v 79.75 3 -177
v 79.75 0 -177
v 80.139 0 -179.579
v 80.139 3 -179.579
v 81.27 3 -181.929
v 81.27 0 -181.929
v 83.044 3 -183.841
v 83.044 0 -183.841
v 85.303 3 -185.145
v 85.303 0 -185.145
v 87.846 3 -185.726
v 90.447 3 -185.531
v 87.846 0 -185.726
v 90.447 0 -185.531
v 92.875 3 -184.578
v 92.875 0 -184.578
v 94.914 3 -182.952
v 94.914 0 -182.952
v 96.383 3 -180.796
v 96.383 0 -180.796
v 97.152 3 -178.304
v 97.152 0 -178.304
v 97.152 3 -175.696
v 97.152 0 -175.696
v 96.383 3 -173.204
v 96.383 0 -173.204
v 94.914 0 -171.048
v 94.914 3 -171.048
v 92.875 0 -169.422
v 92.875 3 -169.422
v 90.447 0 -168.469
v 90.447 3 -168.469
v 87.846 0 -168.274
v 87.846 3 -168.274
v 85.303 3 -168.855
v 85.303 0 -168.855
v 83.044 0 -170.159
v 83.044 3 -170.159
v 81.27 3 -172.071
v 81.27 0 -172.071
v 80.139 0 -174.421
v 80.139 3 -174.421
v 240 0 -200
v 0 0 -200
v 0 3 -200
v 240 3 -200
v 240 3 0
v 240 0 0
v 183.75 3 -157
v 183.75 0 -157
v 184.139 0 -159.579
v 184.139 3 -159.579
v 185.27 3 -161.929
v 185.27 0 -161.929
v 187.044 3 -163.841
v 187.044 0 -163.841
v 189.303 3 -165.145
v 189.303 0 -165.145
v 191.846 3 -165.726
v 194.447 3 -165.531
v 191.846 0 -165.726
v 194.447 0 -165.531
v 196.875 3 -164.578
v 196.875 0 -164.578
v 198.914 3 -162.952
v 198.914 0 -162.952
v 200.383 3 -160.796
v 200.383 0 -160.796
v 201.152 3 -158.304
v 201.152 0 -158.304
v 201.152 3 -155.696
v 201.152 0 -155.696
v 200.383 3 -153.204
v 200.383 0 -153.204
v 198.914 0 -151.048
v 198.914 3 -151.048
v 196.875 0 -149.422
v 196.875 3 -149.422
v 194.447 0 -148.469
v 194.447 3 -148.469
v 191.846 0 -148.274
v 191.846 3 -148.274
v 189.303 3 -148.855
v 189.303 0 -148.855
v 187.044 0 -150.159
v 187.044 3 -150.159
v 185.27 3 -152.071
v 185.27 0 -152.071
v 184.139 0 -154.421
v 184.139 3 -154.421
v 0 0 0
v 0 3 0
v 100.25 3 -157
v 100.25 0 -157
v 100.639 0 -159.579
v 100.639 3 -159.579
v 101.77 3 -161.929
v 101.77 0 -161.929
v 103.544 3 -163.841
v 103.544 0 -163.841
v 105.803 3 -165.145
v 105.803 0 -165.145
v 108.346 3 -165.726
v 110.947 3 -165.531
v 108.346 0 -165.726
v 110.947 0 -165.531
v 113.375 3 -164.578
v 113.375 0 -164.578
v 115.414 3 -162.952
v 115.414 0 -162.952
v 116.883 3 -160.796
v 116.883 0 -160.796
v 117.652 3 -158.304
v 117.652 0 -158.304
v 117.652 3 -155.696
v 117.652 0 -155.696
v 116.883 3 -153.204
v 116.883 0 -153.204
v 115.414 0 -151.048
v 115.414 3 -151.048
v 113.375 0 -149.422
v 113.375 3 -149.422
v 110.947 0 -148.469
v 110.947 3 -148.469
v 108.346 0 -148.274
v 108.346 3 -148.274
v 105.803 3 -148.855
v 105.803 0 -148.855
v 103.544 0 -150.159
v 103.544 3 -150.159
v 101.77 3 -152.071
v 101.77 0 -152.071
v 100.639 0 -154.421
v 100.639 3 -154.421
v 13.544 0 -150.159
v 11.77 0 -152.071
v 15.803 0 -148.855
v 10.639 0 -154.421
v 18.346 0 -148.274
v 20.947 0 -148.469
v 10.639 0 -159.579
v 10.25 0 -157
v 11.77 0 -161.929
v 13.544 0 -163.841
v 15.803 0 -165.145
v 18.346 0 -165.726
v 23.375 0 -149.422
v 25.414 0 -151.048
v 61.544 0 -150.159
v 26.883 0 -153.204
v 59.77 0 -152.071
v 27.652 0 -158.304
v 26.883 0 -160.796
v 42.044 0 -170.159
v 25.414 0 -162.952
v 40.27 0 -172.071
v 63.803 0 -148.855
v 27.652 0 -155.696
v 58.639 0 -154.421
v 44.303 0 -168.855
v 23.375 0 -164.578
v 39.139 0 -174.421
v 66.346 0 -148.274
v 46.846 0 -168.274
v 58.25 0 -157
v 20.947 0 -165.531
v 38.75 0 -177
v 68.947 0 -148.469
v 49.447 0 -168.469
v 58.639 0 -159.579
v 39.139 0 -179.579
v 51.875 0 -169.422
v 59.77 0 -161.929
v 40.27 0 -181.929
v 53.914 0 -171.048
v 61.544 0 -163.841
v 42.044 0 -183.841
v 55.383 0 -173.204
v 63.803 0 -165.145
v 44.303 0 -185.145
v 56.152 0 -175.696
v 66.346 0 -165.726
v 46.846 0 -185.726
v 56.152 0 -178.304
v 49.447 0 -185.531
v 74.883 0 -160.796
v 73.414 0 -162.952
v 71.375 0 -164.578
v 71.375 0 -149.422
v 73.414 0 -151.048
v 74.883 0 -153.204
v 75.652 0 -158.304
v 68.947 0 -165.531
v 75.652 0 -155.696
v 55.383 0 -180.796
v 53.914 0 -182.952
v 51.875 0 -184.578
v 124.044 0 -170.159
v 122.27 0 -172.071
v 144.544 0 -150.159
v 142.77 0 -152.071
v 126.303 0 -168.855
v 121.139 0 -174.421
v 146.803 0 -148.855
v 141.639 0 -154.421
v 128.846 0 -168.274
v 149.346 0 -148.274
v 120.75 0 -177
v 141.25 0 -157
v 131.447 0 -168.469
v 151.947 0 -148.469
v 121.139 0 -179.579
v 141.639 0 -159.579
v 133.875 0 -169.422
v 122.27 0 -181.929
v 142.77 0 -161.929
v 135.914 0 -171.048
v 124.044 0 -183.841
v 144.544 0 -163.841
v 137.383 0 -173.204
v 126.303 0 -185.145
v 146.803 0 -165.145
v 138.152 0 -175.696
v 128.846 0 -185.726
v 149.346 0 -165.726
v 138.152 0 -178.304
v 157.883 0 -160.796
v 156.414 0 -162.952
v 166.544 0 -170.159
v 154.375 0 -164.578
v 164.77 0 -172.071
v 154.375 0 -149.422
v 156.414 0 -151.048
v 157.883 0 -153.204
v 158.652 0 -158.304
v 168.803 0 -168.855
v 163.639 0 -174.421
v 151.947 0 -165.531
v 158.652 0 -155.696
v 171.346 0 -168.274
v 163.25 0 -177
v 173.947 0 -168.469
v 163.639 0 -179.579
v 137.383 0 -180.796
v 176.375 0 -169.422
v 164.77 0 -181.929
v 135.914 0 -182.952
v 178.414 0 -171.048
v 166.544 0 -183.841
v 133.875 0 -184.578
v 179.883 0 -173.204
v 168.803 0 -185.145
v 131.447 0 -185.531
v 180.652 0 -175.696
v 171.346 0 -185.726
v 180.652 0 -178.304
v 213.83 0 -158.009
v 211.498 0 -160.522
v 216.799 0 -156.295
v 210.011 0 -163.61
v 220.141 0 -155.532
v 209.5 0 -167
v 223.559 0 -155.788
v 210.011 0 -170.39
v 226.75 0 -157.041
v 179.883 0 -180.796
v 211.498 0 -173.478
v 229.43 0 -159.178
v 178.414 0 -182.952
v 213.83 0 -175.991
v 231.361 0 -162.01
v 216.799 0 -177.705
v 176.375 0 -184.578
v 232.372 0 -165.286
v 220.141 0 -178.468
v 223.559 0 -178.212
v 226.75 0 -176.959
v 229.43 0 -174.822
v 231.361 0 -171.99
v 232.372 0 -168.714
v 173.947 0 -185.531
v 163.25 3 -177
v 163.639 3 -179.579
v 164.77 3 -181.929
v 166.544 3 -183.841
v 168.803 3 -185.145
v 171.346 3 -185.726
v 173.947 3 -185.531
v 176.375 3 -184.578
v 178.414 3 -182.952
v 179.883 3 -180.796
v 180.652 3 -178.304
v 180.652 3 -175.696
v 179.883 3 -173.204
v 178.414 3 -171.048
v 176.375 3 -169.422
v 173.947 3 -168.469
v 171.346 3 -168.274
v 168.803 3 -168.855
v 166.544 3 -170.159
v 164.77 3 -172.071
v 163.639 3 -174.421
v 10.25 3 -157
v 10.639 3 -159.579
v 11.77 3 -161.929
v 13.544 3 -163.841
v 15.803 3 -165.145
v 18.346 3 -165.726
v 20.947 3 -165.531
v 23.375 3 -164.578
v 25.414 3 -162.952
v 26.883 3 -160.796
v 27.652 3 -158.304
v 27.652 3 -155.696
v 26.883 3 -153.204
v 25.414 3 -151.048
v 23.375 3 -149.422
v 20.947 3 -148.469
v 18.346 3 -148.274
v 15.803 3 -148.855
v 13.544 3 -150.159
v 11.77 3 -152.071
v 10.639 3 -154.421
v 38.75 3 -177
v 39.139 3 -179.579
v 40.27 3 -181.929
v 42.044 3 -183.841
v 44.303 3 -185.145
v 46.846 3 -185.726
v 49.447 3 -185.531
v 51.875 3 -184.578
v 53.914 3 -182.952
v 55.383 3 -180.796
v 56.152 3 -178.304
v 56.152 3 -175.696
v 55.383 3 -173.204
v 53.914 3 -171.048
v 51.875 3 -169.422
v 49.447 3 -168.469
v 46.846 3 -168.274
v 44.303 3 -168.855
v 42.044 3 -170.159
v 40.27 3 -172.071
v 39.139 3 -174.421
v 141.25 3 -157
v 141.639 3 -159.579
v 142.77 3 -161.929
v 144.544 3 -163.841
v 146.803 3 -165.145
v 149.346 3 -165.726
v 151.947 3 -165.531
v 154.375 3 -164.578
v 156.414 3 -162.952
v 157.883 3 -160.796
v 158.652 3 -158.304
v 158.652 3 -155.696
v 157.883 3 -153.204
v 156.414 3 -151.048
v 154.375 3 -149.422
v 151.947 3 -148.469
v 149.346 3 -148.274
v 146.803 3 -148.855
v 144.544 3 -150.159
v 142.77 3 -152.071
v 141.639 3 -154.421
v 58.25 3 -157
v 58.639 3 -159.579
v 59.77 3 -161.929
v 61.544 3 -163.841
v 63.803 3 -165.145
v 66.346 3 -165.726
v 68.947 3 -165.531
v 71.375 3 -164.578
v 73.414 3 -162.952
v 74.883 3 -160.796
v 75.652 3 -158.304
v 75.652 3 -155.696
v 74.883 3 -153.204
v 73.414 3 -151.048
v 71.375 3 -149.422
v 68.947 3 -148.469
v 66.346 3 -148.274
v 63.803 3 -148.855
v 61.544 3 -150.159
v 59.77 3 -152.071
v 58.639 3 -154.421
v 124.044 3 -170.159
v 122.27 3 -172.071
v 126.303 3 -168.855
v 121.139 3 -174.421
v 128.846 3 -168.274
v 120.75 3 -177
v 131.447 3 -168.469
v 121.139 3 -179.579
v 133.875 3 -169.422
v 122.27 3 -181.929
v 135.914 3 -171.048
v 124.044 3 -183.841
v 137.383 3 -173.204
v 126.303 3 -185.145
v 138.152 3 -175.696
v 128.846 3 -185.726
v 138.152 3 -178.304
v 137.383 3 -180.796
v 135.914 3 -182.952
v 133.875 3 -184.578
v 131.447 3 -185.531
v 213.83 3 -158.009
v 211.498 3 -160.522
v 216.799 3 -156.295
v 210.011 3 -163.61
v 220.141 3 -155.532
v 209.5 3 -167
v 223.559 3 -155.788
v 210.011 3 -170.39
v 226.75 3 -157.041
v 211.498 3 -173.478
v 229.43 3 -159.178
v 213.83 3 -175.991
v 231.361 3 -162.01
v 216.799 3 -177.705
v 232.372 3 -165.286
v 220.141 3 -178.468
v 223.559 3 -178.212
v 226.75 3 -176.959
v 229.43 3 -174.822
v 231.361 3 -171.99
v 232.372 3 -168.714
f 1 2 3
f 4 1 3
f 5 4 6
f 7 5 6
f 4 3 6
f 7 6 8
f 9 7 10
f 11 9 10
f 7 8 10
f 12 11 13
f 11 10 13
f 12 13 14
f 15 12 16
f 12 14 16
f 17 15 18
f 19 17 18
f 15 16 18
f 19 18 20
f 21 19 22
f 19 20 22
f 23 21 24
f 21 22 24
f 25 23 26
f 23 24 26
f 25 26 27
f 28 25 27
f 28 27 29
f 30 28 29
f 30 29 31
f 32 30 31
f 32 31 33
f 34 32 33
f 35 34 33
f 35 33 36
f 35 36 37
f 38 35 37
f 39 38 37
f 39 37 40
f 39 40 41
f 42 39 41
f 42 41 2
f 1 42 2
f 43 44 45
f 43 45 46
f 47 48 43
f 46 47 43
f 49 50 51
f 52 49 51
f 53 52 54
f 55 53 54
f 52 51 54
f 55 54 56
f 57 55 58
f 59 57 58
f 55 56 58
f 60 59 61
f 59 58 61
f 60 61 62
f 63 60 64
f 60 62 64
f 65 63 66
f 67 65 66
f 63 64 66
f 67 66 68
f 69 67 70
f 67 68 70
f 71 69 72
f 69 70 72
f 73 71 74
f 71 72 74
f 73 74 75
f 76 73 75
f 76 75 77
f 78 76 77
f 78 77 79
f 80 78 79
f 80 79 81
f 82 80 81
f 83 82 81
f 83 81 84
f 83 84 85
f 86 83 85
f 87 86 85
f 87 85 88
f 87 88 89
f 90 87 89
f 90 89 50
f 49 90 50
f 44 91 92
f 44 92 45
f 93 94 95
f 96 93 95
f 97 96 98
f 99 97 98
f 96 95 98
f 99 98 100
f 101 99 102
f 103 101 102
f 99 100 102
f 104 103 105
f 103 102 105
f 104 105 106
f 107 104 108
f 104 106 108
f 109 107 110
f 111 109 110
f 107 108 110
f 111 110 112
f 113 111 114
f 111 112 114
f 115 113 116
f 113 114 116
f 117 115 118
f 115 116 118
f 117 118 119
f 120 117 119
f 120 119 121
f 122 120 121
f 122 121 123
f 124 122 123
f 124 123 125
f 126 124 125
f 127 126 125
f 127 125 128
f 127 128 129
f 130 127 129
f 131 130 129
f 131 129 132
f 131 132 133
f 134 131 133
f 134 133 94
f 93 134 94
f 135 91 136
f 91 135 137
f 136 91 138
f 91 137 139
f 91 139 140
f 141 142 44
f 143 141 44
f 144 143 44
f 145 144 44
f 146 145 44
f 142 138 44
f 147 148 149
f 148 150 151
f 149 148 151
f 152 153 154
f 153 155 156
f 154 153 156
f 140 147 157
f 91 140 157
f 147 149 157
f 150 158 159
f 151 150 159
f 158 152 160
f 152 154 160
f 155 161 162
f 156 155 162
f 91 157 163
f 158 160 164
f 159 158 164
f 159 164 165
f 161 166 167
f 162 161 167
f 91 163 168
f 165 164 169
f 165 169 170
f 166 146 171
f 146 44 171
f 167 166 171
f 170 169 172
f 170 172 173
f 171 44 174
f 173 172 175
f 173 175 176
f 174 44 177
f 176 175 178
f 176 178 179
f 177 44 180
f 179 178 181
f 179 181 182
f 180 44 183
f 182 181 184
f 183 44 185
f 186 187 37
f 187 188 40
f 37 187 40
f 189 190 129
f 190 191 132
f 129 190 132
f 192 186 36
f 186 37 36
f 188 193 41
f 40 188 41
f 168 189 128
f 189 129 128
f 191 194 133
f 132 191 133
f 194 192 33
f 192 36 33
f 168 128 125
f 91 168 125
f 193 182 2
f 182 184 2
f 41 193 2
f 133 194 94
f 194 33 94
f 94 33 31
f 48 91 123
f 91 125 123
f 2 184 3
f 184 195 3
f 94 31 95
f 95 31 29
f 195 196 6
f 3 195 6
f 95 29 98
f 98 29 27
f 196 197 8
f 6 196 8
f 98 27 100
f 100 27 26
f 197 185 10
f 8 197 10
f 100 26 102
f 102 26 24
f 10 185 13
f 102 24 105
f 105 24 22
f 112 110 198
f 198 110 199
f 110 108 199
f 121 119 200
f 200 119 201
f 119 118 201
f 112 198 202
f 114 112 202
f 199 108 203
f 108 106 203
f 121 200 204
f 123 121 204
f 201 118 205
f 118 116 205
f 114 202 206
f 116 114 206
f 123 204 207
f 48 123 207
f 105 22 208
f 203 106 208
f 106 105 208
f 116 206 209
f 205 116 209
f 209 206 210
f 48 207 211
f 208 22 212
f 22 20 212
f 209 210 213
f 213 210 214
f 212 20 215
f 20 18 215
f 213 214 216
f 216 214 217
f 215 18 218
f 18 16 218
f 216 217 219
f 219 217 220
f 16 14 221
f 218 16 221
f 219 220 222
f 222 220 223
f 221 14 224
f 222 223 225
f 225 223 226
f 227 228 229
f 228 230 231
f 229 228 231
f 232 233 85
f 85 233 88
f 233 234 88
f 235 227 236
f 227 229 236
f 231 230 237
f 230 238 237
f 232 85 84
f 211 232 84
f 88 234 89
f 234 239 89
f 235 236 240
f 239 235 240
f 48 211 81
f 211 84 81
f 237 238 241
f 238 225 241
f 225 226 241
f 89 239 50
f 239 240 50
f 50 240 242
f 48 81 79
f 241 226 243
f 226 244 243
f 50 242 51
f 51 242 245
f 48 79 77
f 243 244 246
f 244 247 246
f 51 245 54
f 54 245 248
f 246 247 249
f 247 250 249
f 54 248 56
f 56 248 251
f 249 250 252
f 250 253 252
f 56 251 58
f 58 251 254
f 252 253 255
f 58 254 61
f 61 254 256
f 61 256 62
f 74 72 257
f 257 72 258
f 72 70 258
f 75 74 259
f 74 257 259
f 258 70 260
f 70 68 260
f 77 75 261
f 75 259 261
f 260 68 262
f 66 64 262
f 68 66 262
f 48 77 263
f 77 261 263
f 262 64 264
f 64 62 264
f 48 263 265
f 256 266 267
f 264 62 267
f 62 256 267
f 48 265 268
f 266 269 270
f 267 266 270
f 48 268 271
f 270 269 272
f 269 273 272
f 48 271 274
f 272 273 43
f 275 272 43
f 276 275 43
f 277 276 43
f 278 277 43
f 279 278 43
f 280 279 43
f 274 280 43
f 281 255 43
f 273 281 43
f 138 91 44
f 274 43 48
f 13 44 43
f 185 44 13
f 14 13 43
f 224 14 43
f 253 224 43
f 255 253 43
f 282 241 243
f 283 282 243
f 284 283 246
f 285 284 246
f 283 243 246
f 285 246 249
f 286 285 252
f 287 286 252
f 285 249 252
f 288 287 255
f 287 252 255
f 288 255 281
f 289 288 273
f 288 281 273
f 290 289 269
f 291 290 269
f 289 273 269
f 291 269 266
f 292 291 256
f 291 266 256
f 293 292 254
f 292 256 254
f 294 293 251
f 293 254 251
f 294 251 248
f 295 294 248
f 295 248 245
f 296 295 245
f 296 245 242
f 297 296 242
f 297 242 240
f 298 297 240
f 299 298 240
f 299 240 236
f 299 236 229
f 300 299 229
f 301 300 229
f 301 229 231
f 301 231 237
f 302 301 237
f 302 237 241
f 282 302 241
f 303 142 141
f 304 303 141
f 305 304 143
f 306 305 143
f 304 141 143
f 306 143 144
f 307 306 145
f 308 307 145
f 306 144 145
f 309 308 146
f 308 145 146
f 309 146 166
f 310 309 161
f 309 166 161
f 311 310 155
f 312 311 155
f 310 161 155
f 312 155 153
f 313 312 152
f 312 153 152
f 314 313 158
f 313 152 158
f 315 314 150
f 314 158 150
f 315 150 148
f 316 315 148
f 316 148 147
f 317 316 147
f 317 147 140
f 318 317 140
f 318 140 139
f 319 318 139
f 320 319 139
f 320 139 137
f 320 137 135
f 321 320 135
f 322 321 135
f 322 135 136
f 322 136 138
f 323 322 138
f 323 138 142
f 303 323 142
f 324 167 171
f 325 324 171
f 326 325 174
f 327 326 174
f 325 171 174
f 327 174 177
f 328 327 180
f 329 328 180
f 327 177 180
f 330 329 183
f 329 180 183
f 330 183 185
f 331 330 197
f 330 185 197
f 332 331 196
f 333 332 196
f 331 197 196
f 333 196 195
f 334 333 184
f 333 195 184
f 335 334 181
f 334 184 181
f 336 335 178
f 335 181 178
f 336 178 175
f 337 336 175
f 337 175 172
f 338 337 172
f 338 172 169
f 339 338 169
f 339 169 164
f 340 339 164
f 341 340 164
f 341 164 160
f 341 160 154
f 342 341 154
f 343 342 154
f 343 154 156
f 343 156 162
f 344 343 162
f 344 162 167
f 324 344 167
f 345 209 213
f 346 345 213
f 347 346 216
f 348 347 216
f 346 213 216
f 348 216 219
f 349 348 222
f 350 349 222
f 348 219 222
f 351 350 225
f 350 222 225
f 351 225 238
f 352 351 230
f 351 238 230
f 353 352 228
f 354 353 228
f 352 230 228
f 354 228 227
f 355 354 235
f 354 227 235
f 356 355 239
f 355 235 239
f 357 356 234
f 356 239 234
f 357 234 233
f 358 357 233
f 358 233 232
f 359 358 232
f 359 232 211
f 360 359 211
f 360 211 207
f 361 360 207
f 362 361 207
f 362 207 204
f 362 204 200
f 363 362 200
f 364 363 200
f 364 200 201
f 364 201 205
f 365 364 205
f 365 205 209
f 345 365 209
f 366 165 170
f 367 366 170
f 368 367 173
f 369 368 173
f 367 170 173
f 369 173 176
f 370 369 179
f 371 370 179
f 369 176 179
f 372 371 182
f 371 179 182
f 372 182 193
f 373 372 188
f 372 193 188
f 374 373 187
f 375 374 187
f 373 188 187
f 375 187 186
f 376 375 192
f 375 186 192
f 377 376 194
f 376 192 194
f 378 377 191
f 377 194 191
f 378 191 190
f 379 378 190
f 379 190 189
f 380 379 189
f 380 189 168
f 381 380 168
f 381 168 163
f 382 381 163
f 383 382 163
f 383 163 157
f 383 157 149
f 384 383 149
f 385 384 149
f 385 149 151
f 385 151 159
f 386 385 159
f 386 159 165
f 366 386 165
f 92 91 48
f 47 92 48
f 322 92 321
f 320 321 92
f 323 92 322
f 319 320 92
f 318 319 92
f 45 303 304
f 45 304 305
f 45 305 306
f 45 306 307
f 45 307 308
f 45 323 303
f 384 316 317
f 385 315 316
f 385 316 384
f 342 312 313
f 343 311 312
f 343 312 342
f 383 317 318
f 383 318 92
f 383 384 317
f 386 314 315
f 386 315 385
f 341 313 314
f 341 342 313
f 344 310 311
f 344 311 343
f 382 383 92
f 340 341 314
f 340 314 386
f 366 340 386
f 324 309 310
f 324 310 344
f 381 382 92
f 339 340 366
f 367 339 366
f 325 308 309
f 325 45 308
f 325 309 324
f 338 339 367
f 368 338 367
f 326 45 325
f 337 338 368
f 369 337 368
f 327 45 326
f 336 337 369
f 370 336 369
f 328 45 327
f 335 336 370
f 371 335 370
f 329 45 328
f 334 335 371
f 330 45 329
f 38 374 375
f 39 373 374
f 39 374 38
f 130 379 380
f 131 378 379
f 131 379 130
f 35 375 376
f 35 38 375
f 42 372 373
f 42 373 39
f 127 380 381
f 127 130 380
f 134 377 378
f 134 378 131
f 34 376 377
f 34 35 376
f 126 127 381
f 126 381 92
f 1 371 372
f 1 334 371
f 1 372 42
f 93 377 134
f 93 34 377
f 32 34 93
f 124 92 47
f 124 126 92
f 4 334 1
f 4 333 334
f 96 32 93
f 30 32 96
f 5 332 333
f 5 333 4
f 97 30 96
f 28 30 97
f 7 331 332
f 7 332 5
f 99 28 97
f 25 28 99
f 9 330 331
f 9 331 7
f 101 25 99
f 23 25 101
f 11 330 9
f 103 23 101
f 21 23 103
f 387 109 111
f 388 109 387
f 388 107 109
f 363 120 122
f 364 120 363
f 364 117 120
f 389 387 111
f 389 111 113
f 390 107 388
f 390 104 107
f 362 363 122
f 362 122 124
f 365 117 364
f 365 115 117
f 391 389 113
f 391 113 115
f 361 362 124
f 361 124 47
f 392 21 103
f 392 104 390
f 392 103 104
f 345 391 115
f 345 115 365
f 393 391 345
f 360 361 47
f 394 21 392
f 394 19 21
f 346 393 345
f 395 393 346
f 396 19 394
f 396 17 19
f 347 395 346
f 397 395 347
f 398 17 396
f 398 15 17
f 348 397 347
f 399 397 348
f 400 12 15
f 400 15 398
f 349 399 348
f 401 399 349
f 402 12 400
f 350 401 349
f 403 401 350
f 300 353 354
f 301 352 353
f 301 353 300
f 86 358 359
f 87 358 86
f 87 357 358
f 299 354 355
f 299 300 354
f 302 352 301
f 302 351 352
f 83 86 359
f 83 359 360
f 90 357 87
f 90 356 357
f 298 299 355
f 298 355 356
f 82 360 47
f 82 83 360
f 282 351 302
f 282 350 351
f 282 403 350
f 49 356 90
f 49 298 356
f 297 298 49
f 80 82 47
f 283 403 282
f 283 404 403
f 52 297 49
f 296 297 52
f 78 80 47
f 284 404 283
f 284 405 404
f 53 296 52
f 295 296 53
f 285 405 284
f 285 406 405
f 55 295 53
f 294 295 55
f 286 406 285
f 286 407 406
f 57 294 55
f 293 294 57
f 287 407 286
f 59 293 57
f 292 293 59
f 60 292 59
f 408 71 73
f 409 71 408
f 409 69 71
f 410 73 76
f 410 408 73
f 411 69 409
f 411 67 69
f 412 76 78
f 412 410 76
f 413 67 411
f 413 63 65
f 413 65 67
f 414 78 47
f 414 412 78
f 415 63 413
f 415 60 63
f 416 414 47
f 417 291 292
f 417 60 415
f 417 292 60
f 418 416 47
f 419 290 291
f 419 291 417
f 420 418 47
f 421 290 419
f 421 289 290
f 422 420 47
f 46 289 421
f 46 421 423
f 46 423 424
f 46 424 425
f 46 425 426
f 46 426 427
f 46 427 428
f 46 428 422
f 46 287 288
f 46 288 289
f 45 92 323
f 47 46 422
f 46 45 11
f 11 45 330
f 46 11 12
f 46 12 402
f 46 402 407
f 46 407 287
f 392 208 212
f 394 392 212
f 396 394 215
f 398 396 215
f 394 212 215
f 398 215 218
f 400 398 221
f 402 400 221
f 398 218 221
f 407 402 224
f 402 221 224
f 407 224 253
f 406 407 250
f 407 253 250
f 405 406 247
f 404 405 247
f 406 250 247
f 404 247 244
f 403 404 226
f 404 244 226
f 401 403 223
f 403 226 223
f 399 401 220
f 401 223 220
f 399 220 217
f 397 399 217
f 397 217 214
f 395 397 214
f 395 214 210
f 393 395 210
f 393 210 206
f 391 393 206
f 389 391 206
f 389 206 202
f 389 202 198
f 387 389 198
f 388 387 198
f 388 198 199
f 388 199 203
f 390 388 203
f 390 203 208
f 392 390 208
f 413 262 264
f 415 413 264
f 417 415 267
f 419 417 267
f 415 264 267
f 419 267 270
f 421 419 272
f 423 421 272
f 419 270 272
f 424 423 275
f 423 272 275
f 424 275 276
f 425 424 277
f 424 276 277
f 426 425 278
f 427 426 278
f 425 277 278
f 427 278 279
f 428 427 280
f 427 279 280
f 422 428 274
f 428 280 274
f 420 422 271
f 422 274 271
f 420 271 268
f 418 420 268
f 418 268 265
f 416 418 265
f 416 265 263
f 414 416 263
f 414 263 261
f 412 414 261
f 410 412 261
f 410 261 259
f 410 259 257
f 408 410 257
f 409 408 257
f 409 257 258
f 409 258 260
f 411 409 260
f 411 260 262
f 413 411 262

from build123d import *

# Parameters (mm, degrees)
SKETCH1_W             = 240
SKETCH1_H             = 200
BOSS_EXTRUDE1_DEPTH   = 3
M16_CLEARANCE_HOLE1_D = 17.5
M22_CLEARANCE_HOLE1_D = 23


with BuildPart() as part:
    # Sketch1 → Boss-Extrude1 (new body)
    with BuildSketch(Plane(origin=(0, 0, 0), x_dir=(1, 0, 0), z_dir=(0, 1, 0))):
        with Locations((120, 100)):
            Rectangle(SKETCH1_W, SKETCH1_H)
    extrude(amount=BOSS_EXTRUDE1_DEPTH)

    # M16 Clearance Hole1 (through all)
    with Locations(Plane(origin=(0, 3, 0), x_dir=(1, 0, 0), z_dir=(0, 1, 0))):
        with Locations((19, 157), (47.5, 177), (67, 157), (88.5, 177), (109, 157), (129.5, 177), (150, 157), (172, 177), (192.5, 157)):
            Hole(M16_CLEARANCE_HOLE1_D / 2)

    # M22 Clearance Hole1 (through all)
    with Locations(Plane(origin=(0, 3, 0), x_dir=(1, 0, 0), z_dir=(0, 1, 0))):
        with Locations((221, 167)):
            Hole(M22_CLEARANCE_HOLE1_D / 2)


solid = part.part
